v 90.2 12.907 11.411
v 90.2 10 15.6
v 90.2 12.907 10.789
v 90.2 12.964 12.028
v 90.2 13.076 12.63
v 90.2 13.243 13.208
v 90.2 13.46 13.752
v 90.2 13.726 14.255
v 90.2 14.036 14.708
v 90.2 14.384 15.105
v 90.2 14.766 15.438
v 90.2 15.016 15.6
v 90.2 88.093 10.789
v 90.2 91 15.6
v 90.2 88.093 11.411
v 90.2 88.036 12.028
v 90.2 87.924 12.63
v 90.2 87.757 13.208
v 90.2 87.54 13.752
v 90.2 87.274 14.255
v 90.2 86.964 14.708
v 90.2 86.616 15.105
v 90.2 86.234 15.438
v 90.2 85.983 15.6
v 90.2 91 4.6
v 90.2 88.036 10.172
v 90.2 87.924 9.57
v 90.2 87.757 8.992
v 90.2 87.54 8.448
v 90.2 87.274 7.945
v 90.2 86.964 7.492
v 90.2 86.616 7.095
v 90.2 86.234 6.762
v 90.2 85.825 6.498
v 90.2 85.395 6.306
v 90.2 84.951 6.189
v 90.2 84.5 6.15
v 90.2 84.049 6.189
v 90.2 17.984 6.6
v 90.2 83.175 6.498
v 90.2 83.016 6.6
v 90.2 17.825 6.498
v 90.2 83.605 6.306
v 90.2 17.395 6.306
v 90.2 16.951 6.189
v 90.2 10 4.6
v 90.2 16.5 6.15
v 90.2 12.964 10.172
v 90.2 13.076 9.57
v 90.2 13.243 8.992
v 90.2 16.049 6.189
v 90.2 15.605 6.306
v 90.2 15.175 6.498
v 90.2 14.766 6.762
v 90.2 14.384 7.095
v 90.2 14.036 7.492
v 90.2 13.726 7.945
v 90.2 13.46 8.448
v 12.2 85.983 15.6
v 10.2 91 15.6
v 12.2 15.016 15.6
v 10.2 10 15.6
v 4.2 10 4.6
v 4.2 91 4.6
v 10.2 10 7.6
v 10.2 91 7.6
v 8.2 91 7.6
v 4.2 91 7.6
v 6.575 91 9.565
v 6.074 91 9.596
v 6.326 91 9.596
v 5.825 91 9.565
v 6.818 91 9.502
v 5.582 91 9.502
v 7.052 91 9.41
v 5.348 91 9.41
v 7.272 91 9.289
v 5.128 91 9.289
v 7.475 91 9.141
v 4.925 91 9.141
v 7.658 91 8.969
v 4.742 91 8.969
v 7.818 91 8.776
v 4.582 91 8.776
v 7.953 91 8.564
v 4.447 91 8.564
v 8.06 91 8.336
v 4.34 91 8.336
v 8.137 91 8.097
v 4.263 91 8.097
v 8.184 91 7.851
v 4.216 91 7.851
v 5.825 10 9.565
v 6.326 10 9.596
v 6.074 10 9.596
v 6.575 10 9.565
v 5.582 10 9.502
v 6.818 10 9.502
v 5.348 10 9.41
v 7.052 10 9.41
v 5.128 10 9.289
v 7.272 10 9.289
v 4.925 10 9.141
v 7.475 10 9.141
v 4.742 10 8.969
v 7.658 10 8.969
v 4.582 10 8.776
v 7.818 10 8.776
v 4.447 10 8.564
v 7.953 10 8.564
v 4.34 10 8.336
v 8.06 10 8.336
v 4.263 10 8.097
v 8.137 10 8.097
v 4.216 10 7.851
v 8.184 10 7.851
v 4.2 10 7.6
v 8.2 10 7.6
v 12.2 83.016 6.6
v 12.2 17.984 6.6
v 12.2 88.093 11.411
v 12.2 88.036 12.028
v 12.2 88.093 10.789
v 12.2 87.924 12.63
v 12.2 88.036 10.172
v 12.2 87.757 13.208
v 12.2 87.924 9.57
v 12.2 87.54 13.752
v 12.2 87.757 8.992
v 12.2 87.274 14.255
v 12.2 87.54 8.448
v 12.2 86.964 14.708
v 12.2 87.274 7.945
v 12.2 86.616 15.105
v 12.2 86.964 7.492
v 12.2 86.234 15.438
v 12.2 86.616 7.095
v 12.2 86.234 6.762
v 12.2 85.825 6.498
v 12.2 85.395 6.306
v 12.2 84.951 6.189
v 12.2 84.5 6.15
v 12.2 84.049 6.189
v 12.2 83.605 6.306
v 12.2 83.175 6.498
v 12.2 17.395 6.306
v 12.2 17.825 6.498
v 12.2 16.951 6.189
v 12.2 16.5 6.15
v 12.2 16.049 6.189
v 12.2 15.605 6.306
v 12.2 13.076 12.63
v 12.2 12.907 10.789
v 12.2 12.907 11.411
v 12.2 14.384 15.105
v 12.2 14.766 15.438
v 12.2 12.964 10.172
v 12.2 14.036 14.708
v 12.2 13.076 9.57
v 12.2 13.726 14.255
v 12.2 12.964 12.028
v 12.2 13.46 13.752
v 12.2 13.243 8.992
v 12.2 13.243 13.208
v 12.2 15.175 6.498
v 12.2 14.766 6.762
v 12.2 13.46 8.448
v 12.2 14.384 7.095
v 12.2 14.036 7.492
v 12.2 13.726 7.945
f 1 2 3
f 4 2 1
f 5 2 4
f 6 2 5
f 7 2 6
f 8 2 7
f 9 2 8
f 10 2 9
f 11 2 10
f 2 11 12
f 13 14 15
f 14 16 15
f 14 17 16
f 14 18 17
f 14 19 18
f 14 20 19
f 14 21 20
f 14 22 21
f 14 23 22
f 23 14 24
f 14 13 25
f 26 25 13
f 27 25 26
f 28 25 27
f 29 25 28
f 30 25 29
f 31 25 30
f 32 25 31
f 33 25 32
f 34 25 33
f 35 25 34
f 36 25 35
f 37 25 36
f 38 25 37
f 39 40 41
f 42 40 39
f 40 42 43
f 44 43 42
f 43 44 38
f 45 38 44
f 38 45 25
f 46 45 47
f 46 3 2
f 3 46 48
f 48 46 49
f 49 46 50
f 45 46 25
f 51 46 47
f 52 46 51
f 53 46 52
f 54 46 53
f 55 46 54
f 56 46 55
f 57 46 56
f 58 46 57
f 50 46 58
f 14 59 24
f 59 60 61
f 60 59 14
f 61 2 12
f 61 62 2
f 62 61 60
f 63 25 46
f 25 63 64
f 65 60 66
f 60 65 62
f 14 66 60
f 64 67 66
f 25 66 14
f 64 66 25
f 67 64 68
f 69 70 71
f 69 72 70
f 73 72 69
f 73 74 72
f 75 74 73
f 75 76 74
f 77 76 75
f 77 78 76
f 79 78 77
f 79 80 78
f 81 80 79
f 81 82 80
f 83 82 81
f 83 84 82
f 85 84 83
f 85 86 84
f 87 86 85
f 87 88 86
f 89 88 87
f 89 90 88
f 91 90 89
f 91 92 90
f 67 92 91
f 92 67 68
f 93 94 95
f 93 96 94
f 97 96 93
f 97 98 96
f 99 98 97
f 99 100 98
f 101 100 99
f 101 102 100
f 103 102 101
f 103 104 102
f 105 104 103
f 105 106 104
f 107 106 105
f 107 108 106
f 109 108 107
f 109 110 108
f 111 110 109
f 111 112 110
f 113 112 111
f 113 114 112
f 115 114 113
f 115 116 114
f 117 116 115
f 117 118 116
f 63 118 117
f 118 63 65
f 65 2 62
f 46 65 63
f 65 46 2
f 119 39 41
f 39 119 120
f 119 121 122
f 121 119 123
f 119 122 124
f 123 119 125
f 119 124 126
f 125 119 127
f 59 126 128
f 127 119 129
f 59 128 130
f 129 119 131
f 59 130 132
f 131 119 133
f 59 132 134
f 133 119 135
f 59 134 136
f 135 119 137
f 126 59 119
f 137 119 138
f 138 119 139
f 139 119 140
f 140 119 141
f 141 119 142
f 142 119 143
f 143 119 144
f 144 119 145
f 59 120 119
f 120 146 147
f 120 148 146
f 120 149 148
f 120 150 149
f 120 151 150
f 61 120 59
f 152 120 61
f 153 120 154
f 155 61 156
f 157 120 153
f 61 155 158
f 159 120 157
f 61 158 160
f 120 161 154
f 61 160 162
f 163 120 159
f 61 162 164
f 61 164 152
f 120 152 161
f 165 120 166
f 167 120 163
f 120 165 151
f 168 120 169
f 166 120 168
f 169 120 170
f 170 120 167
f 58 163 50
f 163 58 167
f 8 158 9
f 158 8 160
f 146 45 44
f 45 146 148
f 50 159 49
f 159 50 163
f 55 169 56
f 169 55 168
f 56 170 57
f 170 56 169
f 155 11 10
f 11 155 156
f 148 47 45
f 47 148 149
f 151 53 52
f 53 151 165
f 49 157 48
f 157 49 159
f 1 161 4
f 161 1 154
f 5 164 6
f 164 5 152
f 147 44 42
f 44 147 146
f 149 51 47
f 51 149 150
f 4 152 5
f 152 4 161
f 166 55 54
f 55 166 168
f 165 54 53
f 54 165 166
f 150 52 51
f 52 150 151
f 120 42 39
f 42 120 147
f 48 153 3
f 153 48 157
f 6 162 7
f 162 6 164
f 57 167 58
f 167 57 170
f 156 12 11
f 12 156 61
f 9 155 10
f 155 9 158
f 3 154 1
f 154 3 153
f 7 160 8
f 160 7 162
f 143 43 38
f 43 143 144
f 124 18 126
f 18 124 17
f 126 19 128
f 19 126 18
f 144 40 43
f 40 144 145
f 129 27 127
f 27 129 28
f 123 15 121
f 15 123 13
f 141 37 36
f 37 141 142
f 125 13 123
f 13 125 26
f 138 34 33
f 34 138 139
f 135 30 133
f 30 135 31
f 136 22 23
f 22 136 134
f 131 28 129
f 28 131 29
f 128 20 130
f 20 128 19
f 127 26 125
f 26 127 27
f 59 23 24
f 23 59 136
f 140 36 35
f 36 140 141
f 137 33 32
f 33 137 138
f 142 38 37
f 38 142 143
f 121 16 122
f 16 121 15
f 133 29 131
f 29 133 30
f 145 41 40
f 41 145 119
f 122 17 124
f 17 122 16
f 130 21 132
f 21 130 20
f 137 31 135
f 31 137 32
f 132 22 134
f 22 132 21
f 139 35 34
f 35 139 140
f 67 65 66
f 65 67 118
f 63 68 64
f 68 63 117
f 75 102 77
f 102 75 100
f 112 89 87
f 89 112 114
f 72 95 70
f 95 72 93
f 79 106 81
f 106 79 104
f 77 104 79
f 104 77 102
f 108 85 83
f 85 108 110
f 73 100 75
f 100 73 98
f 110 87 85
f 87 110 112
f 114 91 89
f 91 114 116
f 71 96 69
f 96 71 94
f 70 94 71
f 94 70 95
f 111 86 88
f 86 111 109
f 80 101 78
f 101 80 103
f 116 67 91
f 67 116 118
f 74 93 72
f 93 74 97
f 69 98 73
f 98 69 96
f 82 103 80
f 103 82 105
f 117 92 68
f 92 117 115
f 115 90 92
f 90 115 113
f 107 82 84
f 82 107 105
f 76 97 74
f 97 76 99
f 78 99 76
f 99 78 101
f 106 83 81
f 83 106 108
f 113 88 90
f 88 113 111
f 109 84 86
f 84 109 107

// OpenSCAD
$fn = 50;

holderX = 120;
holderThickness = 10;
holderZ = 20;

phoneHolderX = 80;
phoneYDispl = 68;
phoneY2 = 77; //with case
phoneZ = 9;

phoneHolderWall = 2;

railExtra = 1;
railRad = 2;


module rail()
{
  cube([holderThickness/2+railExtra,phoneY2+phoneHolderWall*2,3]);
  translate([railRad,0,3]) rotate([-90,0,0]) cylinder(r=railRad,h=phoneY2+phoneHolderWall*2);
}

module U()
{
  hull()
  {
    cube([holderThickness,100,holderZ]);
    translate([0,140,holderZ/2]) rotate([0,90,0]) cylinder(r=holderZ/2,h=holderThickness);
  }
}
/* X(); */

module A()
{
  difference()
  {
    union()
    {
      cube([holderX,holderThickness,holderZ]);
        U();
      translate([holderX-holderThickness,0,0])
        U();
    }
    moveRailX = holderX-holderThickness/2-railExtra;
    moveRailScale = 0;//(holderThickness/2+railExtra)*0.05;
    translate([moveRailX-moveRailScale,0,(holderZ-phoneZ-phoneHolderWall)/2])
      scale([1.05,1,1.05]) rail();
  }
}


module CouchPotatoClamp()
{
  A();
  translate([0,0,holderZ*3])
    A();
  translate([20,0,holderZ]) cube([20,holderThickness,holderZ*2]);
  translate([holderX-40,0,holderZ]) cube([20,holderThickness,holderZ*2]);

  translate([0,30,13])
  union()
  {
    rotate([-50,0,0])
    translate([0,0,holderZ/2])
    cube([holderThickness,10,holderZ*4]);
  }
  translate([holderX-holderThickness,30,13])
  union()
  {
    rotate([-50,0,0])
    translate([0,0,holderZ/2])
    cube([holderThickness,10,holderZ*4]);
  }
}
/* A(); */

module phoneHolder()
{
  difference() {
    cube([phoneHolderX,phoneY2+phoneHolderWall*2,phoneZ+phoneHolderWall]);
    translate([phoneHolderWall,phoneHolderWall+(phoneY2-phoneYDispl)/2,phoneHolderWall]) cube([phoneHolderX-phoneHolderWall,phoneYDispl,phoneZ]);

    translate([phoneHolderWall,phoneHolderWall+(phoneY2-phoneYDispl)/2,phoneHolderWall+phoneZ/2]) rotate([0,90,0])
      scale([1.1,0.8,1]) cylinder(r=phoneZ/2,h=phoneHolderX-phoneHolderWall);
    translate([phoneHolderWall,(phoneY2+phoneHolderWall*2)-phoneHolderWall-(phoneY2-phoneYDispl)/2,phoneHolderWall+phoneZ/2]) rotate([0,90,0])
      scale([1.1,0.8,1]) cylinder(r=phoneZ/2,h=phoneHolderX-phoneHolderWall);
  }
  translate([-holderThickness/2-railExtra,0,0]) rail();
}
translate([10.2,10,(holderZ-phoneZ-phoneHolderWall)/2+0.1]) phoneHolder();
/* translate([-holderX,10,0]) CouchPotatoClamp(); */
